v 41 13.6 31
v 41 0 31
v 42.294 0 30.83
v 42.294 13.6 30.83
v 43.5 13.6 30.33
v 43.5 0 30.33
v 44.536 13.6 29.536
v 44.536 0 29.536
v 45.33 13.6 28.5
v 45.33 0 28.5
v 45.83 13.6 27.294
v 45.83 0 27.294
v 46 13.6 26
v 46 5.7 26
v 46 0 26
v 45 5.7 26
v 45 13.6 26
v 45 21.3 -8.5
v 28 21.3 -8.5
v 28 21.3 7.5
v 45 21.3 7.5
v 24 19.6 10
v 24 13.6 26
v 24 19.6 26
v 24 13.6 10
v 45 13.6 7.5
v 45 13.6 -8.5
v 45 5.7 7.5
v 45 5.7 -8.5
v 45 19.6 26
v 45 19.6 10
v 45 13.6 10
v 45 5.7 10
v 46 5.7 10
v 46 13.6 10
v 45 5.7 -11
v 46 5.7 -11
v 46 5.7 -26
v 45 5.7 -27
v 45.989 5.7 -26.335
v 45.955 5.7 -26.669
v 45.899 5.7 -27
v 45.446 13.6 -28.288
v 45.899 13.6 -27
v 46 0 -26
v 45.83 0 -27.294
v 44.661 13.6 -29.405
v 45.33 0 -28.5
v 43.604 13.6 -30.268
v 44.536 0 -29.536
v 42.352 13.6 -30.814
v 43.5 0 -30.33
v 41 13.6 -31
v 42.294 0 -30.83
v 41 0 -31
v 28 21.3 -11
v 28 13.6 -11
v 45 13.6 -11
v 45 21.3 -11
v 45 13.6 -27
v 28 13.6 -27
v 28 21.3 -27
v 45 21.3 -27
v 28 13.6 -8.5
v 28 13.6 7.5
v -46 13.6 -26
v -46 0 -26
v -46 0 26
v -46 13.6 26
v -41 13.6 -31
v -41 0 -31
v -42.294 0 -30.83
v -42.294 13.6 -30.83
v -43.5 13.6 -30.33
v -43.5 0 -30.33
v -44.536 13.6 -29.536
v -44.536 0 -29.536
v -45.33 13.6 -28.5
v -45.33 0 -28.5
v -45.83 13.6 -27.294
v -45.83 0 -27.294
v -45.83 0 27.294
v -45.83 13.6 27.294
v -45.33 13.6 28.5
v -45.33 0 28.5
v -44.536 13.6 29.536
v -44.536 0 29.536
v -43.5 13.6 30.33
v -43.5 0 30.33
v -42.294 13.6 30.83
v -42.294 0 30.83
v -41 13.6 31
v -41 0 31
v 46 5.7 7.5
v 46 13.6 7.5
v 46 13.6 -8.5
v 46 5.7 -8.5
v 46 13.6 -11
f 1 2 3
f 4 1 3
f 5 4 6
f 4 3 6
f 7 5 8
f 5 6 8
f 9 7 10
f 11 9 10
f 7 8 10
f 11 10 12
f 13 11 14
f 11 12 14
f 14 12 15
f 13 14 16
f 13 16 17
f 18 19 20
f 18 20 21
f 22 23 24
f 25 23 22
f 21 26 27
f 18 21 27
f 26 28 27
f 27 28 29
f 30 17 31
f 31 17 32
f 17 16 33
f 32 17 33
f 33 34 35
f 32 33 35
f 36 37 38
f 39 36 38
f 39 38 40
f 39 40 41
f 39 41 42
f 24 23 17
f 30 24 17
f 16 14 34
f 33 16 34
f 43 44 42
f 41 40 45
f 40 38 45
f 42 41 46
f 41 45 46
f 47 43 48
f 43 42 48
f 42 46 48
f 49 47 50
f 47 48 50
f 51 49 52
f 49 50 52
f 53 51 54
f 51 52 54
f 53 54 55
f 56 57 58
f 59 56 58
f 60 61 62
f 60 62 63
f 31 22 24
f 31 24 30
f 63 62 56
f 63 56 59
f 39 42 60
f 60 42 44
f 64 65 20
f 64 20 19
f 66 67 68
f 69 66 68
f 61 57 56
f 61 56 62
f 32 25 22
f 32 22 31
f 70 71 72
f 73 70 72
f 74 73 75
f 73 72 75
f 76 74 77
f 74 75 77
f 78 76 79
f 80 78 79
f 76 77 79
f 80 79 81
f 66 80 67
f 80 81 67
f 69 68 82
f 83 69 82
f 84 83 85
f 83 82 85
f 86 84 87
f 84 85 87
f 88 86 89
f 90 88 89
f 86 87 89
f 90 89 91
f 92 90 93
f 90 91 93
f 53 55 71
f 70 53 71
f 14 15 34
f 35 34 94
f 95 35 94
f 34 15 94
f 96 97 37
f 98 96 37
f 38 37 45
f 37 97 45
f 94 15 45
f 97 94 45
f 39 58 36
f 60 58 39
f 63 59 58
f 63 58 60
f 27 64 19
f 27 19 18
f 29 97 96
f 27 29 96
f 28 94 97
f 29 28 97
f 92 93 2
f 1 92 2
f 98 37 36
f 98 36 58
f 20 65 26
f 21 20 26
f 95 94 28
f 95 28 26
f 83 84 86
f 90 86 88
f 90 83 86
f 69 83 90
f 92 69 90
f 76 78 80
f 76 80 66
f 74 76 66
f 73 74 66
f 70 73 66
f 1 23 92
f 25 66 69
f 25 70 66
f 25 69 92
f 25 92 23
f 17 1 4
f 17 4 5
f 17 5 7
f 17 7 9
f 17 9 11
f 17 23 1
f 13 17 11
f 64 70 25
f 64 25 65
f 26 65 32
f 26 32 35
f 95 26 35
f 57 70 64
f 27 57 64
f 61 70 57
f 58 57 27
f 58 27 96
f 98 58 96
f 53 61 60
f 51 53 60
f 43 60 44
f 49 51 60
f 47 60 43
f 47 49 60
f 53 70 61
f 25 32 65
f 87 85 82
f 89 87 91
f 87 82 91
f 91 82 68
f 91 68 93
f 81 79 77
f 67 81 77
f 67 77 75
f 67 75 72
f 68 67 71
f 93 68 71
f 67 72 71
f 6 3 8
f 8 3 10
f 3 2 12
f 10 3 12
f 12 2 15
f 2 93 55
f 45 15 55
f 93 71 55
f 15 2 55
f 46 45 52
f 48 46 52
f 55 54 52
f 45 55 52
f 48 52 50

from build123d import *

# Parameters (mm, degrees)
EXTRUDE_1_DEPTH     = 13.6
SKETCH_3_W          = 16
SKETCH_3_H          = 7.9
CUT_EXTRUDE_3_DEPTH = 1
SKETCH_5_W          = 21
SKETCH_5_H          = 16
EXTRUDE_2_DEPTH     = 6
SKETCH_5_4_W        = 17
SKETCH_5_4_H        = 16
EXTRUDE_3_DEPTH     = 7.7


with BuildPart() as part:
    # Эскиз1 → Бобышка-Вытянуть1 (new body)
    with BuildSketch(Plane(origin=(0, 0, 0), x_dir=(1, 0, 0), z_dir=(0, 1, 0))):
        with BuildLine():
            Line((41, 31), (-41, 31))
            ThreePointArc((-41, 31), (-44.535533906, 29.535533906), (-46, 26))
            Line((-46, 26), (-46, -26))
            ThreePointArc((-46, -26), (-44.535533906, -29.535533906), (-41, -31))
            Line((-41, -31), (41, -31))
            ThreePointArc((41, -31), (44.535533906, -29.535533906), (46, -26))
            Line((46, -26), (46, 26))
            ThreePointArc((46, 26), (44.535533906, 29.535533906), (41, 31))
        make_face()
    extrude(amount=EXTRUDE_1_DEPTH)

    # Эскиз3 → Вырез-Вытянуть3 (cut)
    with BuildSketch(Plane(origin=(46, 0, 0), x_dir=(0, 0, -1), z_dir=(1, 0, 0))):
        with Locations((-18, 9.65)):
            Rectangle(SKETCH_3_W, SKETCH_3_H)
        with Locations((0.5, 9.65)):
            Rectangle(SKETCH_3_W, SKETCH_3_H)
        with Locations((19, 9.65)):
            Rectangle(SKETCH_3_W, SKETCH_3_H)
    extrude(amount=-CUT_EXTRUDE_3_DEPTH, mode=Mode.SUBTRACT)

    # Эскиз5 → Бобышка-Вытянуть2 (add)
    with BuildSketch(Plane(origin=(0, 13.6, 0), x_dir=(1, 0, 0), z_dir=(0, 1, 0))):
        with Locations((34.5, -18)):
            Rectangle(SKETCH_5_W, SKETCH_5_H)
    extrude(amount=EXTRUDE_2_DEPTH)

    # Эскиз5<4> → Бобышка-Вытянуть3 (add)
    with BuildSketch(Plane(origin=(0, 13.6, 0), x_dir=(1, 0, 0), z_dir=(0, 1, 0))):
        with Locations((36.5, 0.5)):
            Rectangle(SKETCH_5_4_W, SKETCH_5_4_H)
        with Locations((36.5, 19)):
            Rectangle(SKETCH_5_4_W, SKETCH_5_4_H)
    extrude(amount=EXTRUDE_3_DEPTH)


solid = part.part
